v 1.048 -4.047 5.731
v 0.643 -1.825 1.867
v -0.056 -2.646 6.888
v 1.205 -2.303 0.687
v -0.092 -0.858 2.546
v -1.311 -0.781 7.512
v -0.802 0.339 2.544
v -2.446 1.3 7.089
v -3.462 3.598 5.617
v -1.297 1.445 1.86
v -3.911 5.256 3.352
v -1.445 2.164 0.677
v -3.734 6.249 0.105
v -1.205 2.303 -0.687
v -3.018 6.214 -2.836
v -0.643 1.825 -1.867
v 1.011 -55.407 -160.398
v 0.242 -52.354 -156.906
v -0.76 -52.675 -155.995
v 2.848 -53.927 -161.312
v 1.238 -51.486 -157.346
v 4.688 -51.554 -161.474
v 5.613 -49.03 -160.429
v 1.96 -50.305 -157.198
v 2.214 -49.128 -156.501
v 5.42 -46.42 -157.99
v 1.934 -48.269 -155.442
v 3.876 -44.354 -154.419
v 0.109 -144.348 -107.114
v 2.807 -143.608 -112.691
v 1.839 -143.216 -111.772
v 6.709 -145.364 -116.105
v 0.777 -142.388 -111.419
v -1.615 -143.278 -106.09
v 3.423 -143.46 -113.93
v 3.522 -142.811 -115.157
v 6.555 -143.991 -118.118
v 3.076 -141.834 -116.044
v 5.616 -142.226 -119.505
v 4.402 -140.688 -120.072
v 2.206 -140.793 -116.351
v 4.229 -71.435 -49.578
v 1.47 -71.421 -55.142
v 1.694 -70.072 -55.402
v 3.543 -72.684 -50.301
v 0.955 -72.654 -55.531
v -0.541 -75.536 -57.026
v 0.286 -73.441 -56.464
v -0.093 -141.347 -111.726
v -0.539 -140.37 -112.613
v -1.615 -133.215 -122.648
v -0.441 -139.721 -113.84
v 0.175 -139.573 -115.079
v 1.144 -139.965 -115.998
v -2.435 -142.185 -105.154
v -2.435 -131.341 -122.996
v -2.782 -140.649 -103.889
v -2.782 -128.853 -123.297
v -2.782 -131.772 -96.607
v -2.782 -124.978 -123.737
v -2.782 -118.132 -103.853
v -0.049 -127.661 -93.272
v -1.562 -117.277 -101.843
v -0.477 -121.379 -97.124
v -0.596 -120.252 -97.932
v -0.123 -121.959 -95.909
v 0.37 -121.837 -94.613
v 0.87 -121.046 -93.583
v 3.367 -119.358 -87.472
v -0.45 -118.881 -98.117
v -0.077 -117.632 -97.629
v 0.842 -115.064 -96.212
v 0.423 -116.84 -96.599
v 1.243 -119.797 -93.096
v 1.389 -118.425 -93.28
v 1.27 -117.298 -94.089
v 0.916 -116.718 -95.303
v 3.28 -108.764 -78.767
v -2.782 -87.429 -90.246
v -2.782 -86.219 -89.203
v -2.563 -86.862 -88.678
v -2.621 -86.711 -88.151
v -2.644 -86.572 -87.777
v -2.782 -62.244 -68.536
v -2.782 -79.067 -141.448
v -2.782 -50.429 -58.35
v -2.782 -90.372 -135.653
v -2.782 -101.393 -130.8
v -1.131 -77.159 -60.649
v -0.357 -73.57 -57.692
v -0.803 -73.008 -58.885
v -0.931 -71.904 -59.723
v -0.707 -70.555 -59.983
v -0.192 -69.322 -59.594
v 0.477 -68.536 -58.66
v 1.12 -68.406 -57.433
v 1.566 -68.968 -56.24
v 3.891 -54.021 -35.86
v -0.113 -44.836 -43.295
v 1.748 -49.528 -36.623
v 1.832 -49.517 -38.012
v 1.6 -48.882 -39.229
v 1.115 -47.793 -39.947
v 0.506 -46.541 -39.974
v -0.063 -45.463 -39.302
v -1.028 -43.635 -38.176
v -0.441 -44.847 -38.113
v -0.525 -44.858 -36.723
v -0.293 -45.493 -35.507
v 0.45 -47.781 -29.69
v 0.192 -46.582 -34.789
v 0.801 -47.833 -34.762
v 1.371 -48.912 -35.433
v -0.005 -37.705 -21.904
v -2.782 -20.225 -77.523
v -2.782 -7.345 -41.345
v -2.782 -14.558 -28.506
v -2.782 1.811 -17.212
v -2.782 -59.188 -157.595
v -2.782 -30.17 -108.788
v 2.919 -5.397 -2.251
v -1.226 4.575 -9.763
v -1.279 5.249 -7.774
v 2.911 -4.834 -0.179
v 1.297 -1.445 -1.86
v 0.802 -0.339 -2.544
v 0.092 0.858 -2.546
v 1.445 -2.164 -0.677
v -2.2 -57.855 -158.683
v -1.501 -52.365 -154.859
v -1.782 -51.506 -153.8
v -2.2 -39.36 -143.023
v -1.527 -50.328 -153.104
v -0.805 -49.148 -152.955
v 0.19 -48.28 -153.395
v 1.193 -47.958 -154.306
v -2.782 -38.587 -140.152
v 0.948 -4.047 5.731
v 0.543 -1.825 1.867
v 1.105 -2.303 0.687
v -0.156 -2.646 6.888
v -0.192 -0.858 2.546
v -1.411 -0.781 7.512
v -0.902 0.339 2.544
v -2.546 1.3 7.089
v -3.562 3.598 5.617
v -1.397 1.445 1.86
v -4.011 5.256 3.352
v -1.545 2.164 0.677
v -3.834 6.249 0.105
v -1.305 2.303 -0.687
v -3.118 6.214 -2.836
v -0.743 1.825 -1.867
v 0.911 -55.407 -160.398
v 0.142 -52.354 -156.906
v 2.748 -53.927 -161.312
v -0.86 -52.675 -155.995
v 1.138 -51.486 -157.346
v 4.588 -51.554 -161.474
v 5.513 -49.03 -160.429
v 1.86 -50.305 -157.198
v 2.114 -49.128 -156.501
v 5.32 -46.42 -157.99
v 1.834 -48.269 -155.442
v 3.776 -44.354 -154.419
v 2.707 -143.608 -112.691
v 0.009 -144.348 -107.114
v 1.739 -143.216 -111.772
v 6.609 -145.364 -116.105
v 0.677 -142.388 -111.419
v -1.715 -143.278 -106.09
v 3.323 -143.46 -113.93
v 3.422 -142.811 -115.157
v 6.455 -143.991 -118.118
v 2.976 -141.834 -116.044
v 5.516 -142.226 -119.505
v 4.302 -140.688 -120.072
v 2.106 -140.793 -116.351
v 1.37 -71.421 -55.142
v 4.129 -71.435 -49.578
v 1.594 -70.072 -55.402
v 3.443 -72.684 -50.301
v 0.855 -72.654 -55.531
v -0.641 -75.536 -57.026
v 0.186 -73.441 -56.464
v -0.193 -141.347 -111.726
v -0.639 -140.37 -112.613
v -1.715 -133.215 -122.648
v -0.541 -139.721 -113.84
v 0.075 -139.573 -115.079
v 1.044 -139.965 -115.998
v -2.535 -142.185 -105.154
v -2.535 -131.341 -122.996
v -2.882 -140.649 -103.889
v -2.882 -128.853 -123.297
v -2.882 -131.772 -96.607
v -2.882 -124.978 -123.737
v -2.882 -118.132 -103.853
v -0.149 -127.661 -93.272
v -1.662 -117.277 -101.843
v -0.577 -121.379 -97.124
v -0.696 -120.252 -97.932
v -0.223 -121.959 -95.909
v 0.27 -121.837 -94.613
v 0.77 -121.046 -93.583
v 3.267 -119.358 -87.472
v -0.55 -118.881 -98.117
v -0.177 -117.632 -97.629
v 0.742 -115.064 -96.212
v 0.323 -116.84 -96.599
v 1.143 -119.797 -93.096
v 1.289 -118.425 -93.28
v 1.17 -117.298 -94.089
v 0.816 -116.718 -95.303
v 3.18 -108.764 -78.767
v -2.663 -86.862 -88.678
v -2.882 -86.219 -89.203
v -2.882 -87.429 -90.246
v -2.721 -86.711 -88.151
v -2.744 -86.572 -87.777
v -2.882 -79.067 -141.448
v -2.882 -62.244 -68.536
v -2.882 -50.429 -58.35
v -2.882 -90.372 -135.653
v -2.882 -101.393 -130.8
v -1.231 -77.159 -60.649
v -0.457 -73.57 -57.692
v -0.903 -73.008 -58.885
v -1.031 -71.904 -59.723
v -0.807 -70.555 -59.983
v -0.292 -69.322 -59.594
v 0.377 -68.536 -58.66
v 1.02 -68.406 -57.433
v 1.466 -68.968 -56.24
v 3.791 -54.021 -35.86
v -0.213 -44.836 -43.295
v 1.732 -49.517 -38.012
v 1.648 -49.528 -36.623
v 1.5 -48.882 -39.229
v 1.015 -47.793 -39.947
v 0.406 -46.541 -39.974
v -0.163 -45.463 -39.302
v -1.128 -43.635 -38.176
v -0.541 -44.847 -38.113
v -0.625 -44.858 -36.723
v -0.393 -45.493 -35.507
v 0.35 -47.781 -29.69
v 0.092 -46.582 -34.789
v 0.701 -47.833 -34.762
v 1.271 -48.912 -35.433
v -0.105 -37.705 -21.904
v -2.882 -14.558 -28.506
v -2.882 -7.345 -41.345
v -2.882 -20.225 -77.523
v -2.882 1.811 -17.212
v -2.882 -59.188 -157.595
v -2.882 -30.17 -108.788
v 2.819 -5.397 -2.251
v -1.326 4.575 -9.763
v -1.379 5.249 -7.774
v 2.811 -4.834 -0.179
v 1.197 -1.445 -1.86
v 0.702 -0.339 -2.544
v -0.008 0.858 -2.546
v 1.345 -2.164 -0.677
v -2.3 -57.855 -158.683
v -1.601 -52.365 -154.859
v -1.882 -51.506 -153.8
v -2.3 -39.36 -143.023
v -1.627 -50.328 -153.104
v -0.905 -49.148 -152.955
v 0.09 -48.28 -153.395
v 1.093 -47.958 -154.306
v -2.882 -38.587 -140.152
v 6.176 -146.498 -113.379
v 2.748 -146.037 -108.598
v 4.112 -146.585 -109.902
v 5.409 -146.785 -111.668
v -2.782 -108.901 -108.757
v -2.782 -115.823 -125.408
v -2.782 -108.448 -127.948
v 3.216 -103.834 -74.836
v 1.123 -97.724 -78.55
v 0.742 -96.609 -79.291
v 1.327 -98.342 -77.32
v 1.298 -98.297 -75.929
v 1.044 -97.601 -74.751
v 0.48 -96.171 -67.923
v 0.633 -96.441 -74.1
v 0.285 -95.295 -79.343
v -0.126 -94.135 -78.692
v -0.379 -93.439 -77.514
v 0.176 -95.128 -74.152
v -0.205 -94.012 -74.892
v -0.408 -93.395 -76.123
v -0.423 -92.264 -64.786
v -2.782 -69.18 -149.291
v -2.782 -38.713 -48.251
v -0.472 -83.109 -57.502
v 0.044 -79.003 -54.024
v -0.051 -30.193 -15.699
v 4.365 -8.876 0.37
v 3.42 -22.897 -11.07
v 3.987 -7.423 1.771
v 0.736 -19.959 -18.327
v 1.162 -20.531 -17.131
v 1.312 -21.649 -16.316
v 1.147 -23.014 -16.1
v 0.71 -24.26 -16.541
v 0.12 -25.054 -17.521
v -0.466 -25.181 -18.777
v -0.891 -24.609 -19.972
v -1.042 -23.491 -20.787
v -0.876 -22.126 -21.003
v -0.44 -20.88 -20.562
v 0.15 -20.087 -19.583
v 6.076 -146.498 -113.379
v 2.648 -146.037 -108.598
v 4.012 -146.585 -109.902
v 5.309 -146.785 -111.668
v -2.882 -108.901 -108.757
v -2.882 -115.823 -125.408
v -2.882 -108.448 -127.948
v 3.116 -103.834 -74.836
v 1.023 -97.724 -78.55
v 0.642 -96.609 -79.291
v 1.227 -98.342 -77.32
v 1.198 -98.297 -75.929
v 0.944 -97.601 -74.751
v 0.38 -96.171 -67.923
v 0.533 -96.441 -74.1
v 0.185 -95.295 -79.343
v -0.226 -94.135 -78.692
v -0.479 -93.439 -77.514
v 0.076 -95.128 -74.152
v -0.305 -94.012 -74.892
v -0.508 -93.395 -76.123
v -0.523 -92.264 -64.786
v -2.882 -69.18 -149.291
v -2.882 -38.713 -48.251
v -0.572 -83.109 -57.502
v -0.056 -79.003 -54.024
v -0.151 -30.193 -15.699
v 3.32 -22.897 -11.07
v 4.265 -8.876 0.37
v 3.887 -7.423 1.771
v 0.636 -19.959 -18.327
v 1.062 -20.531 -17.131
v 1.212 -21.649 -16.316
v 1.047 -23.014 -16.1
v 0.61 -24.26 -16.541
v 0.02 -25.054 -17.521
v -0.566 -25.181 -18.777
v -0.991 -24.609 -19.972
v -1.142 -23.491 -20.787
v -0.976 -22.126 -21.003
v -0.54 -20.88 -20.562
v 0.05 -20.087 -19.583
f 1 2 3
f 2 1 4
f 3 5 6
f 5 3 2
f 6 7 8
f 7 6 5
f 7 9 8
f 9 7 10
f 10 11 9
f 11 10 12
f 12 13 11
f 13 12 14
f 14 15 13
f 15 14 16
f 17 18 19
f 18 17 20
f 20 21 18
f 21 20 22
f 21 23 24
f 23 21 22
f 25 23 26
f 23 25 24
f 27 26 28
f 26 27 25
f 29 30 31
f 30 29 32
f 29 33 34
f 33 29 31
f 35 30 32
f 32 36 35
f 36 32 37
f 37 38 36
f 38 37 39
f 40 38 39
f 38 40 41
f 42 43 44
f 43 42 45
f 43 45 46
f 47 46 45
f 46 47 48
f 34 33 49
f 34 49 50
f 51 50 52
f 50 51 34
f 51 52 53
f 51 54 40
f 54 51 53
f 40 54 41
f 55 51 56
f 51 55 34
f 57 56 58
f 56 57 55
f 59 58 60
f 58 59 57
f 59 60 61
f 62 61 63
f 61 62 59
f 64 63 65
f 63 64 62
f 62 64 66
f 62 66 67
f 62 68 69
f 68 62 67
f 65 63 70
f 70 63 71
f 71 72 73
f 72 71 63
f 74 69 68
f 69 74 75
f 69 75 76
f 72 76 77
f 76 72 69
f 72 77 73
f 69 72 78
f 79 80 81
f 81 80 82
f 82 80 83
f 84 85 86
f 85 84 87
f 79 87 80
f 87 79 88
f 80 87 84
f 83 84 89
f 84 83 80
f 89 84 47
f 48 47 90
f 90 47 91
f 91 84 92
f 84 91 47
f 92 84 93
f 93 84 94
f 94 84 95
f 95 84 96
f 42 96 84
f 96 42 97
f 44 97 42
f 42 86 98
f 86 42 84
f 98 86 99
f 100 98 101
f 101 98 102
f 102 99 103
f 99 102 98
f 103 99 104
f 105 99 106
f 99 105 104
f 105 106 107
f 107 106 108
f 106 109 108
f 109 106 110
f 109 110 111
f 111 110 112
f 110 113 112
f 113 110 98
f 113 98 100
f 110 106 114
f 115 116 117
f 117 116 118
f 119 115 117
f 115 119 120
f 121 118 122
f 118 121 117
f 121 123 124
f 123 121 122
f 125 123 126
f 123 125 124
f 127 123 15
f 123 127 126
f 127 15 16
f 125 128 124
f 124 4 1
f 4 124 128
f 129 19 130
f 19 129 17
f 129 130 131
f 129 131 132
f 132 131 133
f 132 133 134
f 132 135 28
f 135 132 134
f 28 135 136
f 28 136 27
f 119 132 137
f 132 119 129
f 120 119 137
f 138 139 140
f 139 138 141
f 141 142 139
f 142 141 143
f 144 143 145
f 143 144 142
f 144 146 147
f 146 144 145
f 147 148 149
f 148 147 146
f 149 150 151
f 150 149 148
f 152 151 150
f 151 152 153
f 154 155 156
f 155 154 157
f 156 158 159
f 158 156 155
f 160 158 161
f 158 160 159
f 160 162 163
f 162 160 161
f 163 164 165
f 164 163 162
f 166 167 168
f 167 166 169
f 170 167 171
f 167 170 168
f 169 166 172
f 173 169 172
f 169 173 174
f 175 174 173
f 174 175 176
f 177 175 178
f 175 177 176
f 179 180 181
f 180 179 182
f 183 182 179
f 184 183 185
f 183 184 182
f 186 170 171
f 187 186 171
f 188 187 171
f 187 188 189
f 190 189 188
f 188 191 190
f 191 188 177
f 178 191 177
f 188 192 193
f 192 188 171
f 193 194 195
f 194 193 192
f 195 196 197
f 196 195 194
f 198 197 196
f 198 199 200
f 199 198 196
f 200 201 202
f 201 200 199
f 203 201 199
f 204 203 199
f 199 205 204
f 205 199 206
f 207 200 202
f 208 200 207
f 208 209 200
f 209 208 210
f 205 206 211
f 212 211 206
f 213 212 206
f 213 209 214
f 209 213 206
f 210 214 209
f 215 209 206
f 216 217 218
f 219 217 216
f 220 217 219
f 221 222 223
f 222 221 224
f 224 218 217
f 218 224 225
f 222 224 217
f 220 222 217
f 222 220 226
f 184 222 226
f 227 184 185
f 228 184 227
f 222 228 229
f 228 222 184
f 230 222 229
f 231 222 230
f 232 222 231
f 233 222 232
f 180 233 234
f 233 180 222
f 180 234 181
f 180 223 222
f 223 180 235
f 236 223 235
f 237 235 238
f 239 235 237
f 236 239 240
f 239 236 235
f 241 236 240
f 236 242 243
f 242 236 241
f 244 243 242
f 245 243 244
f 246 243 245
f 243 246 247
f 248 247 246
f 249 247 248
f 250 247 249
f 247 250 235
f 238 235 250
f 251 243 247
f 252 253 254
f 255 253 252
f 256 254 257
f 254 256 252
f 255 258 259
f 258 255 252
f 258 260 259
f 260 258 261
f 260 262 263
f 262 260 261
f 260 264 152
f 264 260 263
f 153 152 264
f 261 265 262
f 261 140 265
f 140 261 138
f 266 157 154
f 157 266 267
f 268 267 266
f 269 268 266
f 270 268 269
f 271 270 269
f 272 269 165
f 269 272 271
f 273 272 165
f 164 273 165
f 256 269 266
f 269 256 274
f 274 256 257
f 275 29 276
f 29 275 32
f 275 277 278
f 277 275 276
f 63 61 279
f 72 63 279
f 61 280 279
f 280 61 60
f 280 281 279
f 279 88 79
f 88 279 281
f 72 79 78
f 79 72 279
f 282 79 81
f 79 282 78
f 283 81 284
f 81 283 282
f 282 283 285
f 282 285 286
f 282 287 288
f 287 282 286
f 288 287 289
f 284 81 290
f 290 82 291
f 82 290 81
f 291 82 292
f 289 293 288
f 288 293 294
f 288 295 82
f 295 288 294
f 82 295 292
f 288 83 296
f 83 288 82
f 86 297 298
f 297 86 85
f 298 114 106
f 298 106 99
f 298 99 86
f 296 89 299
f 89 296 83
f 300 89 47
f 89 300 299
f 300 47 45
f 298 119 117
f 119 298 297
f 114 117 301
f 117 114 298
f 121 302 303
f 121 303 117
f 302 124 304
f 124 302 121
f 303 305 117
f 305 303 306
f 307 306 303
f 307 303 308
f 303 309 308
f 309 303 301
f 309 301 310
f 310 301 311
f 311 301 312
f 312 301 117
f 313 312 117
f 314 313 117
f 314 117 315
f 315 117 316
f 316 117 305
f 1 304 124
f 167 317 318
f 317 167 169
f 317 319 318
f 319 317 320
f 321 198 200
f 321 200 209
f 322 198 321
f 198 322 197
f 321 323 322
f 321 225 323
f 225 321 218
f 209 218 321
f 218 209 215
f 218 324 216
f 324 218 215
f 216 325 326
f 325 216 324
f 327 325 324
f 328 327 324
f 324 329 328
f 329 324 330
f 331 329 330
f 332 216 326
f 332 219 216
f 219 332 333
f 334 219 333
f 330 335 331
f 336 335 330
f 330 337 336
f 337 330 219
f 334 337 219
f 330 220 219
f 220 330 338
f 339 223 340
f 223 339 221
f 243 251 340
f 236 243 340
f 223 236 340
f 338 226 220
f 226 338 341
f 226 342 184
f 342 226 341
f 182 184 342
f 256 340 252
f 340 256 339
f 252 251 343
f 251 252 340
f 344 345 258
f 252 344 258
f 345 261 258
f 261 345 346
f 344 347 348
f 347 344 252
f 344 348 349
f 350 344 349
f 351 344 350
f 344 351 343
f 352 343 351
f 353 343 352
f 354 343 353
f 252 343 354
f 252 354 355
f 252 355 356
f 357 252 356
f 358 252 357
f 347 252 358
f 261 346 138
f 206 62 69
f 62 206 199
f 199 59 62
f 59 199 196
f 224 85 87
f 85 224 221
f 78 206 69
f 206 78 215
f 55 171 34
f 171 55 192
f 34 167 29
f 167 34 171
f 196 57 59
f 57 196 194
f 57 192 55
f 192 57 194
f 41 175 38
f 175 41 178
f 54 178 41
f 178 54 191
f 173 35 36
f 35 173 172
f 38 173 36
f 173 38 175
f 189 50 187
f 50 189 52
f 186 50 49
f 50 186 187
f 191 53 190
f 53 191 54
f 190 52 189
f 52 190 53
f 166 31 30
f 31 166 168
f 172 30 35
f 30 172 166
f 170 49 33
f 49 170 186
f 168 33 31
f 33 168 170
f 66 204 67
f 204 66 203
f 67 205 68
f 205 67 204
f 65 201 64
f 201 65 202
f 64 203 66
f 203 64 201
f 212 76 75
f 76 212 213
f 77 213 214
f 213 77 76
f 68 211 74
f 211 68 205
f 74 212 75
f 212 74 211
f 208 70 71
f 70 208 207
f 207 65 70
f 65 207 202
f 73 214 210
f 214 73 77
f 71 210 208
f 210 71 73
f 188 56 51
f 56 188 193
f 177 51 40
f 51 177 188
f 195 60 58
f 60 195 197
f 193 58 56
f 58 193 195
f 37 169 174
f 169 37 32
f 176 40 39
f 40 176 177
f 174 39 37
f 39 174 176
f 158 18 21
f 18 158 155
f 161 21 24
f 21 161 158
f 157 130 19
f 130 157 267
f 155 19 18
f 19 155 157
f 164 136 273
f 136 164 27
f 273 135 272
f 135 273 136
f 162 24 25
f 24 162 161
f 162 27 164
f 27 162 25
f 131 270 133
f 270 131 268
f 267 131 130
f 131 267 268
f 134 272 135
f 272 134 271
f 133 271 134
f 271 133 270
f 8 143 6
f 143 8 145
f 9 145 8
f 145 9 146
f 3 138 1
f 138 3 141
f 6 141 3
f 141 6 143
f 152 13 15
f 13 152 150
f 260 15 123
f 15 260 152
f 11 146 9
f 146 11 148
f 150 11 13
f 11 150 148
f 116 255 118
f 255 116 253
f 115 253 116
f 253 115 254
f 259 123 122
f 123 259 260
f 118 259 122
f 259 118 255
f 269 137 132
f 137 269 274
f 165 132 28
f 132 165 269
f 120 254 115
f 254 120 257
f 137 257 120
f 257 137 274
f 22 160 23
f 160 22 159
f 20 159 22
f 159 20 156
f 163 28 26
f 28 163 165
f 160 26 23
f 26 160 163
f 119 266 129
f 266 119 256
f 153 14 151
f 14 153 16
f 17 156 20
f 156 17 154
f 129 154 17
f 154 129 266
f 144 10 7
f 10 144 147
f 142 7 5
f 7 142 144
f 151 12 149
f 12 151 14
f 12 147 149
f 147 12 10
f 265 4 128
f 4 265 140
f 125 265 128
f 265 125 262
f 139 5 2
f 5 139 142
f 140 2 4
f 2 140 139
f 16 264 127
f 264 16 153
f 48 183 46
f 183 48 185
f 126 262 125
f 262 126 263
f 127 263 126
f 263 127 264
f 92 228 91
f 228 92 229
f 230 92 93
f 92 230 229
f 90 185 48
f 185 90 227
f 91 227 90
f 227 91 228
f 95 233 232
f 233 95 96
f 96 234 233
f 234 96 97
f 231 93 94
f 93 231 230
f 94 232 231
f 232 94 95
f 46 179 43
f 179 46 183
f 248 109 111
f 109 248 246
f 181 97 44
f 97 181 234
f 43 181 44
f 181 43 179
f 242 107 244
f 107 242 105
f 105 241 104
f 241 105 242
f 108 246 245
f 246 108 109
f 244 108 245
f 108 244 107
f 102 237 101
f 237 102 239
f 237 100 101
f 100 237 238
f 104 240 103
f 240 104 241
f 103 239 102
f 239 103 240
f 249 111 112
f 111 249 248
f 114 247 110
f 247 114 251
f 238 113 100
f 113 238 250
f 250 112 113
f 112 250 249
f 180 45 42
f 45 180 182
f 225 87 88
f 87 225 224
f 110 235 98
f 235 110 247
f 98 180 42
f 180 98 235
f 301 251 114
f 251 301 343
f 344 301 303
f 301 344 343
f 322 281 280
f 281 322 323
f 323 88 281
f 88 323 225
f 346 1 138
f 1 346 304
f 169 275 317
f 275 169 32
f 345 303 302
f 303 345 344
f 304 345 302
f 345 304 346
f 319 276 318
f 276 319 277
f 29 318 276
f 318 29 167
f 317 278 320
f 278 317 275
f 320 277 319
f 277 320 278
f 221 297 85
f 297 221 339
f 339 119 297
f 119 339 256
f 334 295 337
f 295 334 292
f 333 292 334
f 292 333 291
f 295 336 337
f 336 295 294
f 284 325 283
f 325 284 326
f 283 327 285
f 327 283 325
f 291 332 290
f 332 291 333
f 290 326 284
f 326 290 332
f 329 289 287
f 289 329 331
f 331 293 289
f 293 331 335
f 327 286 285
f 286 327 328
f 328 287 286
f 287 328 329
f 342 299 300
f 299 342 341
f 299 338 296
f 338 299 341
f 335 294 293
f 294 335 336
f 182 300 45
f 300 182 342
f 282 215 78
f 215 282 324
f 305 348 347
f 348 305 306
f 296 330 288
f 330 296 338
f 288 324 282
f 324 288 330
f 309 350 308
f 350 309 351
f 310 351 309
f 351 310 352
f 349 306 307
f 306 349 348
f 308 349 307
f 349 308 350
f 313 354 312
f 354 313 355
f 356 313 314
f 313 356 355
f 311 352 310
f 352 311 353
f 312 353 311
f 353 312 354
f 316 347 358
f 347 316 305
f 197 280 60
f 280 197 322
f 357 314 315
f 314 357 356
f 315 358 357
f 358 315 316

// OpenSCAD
use <../lib.scad>
use <s/u9496c01s01.scad>
use <s/u9496c01s02.scad>
use <s/u9496c01s03.scad>
use <s/u9496c01s04.scad>
function ldraw_lib__u9496c01() = [
// 0 Sheet Fabric 15 x 22 Triangular Sail (Formed Shape 1)
// 0 Name: u9496c01.dat
// 0 Author: Philippe Hurbain [Philo]
// 0 !LDRAW_ORG Part UPDATE 2022-03
// 0 !LICENSE Licensed under CC BY 2.0 and CC BY 4.0 : see CAreadme.txt
// 
// 0 BFC CERTIFY CCW
  [0,"BFC","CERTIFY"],
  [0,"BFC","CCW"],
// 
// 0 !CATEGORY Sheet Fabric
// 
// 0 !HISTORY 2022-05-07 [PTadmin] Official Update 2022-03
// 
// 
// 1 16 0 0 0 1 0 0 0 1 0 0 0 1 s\u9496c01s01.dat
  [1,16,0,0,0,1,0,0,0,1,0,0,0,1, ldraw_lib__s__u9496c01s01()],
// 0 BFC INVERTNEXT
  [0,"BFC","INVERTNEXT"],
// 1 16 -.25 0 0 1 0 0 0 1 0 0 0 1 s\u9496c01s01.dat
  [1,16,-.25,0,0,1,0,0,0,1,0,0,0,1, ldraw_lib__s__u9496c01s01()],
// 
// 1 16 0 0 0 1 0 0 0 1 0 0 0 1 s\u9496c01s02.dat
  [1,16,0,0,0,1,0,0,0,1,0,0,0,1, ldraw_lib__s__u9496c01s02()],
// 0 BFC INVERTNEXT
  [0,"BFC","INVERTNEXT"],
// 1 16 -.25 0 0 1 0 0 0 1 0 0 0 1 s\u9496c01s02.dat
  [1,16,-.25,0,0,1,0,0,0,1,0,0,0,1, ldraw_lib__s__u9496c01s02()],
// 
// 1 16 0 0 0 1 0 0 0 1 0 0 0 1 s\u9496c01s03.dat
  [1,16,0,0,0,1,0,0,0,1,0,0,0,1, ldraw_lib__s__u9496c01s03()],
// 1 16 0 0 0 1 0 0 0 1 0 0 0 1 s\u9496c01s04.dat
  [1,16,0,0,0,1,0,0,0,1,0,0,0,1, ldraw_lib__s__u9496c01s04()],
];
makepoly(ldraw_lib__u9496c01(), line=0.2);
